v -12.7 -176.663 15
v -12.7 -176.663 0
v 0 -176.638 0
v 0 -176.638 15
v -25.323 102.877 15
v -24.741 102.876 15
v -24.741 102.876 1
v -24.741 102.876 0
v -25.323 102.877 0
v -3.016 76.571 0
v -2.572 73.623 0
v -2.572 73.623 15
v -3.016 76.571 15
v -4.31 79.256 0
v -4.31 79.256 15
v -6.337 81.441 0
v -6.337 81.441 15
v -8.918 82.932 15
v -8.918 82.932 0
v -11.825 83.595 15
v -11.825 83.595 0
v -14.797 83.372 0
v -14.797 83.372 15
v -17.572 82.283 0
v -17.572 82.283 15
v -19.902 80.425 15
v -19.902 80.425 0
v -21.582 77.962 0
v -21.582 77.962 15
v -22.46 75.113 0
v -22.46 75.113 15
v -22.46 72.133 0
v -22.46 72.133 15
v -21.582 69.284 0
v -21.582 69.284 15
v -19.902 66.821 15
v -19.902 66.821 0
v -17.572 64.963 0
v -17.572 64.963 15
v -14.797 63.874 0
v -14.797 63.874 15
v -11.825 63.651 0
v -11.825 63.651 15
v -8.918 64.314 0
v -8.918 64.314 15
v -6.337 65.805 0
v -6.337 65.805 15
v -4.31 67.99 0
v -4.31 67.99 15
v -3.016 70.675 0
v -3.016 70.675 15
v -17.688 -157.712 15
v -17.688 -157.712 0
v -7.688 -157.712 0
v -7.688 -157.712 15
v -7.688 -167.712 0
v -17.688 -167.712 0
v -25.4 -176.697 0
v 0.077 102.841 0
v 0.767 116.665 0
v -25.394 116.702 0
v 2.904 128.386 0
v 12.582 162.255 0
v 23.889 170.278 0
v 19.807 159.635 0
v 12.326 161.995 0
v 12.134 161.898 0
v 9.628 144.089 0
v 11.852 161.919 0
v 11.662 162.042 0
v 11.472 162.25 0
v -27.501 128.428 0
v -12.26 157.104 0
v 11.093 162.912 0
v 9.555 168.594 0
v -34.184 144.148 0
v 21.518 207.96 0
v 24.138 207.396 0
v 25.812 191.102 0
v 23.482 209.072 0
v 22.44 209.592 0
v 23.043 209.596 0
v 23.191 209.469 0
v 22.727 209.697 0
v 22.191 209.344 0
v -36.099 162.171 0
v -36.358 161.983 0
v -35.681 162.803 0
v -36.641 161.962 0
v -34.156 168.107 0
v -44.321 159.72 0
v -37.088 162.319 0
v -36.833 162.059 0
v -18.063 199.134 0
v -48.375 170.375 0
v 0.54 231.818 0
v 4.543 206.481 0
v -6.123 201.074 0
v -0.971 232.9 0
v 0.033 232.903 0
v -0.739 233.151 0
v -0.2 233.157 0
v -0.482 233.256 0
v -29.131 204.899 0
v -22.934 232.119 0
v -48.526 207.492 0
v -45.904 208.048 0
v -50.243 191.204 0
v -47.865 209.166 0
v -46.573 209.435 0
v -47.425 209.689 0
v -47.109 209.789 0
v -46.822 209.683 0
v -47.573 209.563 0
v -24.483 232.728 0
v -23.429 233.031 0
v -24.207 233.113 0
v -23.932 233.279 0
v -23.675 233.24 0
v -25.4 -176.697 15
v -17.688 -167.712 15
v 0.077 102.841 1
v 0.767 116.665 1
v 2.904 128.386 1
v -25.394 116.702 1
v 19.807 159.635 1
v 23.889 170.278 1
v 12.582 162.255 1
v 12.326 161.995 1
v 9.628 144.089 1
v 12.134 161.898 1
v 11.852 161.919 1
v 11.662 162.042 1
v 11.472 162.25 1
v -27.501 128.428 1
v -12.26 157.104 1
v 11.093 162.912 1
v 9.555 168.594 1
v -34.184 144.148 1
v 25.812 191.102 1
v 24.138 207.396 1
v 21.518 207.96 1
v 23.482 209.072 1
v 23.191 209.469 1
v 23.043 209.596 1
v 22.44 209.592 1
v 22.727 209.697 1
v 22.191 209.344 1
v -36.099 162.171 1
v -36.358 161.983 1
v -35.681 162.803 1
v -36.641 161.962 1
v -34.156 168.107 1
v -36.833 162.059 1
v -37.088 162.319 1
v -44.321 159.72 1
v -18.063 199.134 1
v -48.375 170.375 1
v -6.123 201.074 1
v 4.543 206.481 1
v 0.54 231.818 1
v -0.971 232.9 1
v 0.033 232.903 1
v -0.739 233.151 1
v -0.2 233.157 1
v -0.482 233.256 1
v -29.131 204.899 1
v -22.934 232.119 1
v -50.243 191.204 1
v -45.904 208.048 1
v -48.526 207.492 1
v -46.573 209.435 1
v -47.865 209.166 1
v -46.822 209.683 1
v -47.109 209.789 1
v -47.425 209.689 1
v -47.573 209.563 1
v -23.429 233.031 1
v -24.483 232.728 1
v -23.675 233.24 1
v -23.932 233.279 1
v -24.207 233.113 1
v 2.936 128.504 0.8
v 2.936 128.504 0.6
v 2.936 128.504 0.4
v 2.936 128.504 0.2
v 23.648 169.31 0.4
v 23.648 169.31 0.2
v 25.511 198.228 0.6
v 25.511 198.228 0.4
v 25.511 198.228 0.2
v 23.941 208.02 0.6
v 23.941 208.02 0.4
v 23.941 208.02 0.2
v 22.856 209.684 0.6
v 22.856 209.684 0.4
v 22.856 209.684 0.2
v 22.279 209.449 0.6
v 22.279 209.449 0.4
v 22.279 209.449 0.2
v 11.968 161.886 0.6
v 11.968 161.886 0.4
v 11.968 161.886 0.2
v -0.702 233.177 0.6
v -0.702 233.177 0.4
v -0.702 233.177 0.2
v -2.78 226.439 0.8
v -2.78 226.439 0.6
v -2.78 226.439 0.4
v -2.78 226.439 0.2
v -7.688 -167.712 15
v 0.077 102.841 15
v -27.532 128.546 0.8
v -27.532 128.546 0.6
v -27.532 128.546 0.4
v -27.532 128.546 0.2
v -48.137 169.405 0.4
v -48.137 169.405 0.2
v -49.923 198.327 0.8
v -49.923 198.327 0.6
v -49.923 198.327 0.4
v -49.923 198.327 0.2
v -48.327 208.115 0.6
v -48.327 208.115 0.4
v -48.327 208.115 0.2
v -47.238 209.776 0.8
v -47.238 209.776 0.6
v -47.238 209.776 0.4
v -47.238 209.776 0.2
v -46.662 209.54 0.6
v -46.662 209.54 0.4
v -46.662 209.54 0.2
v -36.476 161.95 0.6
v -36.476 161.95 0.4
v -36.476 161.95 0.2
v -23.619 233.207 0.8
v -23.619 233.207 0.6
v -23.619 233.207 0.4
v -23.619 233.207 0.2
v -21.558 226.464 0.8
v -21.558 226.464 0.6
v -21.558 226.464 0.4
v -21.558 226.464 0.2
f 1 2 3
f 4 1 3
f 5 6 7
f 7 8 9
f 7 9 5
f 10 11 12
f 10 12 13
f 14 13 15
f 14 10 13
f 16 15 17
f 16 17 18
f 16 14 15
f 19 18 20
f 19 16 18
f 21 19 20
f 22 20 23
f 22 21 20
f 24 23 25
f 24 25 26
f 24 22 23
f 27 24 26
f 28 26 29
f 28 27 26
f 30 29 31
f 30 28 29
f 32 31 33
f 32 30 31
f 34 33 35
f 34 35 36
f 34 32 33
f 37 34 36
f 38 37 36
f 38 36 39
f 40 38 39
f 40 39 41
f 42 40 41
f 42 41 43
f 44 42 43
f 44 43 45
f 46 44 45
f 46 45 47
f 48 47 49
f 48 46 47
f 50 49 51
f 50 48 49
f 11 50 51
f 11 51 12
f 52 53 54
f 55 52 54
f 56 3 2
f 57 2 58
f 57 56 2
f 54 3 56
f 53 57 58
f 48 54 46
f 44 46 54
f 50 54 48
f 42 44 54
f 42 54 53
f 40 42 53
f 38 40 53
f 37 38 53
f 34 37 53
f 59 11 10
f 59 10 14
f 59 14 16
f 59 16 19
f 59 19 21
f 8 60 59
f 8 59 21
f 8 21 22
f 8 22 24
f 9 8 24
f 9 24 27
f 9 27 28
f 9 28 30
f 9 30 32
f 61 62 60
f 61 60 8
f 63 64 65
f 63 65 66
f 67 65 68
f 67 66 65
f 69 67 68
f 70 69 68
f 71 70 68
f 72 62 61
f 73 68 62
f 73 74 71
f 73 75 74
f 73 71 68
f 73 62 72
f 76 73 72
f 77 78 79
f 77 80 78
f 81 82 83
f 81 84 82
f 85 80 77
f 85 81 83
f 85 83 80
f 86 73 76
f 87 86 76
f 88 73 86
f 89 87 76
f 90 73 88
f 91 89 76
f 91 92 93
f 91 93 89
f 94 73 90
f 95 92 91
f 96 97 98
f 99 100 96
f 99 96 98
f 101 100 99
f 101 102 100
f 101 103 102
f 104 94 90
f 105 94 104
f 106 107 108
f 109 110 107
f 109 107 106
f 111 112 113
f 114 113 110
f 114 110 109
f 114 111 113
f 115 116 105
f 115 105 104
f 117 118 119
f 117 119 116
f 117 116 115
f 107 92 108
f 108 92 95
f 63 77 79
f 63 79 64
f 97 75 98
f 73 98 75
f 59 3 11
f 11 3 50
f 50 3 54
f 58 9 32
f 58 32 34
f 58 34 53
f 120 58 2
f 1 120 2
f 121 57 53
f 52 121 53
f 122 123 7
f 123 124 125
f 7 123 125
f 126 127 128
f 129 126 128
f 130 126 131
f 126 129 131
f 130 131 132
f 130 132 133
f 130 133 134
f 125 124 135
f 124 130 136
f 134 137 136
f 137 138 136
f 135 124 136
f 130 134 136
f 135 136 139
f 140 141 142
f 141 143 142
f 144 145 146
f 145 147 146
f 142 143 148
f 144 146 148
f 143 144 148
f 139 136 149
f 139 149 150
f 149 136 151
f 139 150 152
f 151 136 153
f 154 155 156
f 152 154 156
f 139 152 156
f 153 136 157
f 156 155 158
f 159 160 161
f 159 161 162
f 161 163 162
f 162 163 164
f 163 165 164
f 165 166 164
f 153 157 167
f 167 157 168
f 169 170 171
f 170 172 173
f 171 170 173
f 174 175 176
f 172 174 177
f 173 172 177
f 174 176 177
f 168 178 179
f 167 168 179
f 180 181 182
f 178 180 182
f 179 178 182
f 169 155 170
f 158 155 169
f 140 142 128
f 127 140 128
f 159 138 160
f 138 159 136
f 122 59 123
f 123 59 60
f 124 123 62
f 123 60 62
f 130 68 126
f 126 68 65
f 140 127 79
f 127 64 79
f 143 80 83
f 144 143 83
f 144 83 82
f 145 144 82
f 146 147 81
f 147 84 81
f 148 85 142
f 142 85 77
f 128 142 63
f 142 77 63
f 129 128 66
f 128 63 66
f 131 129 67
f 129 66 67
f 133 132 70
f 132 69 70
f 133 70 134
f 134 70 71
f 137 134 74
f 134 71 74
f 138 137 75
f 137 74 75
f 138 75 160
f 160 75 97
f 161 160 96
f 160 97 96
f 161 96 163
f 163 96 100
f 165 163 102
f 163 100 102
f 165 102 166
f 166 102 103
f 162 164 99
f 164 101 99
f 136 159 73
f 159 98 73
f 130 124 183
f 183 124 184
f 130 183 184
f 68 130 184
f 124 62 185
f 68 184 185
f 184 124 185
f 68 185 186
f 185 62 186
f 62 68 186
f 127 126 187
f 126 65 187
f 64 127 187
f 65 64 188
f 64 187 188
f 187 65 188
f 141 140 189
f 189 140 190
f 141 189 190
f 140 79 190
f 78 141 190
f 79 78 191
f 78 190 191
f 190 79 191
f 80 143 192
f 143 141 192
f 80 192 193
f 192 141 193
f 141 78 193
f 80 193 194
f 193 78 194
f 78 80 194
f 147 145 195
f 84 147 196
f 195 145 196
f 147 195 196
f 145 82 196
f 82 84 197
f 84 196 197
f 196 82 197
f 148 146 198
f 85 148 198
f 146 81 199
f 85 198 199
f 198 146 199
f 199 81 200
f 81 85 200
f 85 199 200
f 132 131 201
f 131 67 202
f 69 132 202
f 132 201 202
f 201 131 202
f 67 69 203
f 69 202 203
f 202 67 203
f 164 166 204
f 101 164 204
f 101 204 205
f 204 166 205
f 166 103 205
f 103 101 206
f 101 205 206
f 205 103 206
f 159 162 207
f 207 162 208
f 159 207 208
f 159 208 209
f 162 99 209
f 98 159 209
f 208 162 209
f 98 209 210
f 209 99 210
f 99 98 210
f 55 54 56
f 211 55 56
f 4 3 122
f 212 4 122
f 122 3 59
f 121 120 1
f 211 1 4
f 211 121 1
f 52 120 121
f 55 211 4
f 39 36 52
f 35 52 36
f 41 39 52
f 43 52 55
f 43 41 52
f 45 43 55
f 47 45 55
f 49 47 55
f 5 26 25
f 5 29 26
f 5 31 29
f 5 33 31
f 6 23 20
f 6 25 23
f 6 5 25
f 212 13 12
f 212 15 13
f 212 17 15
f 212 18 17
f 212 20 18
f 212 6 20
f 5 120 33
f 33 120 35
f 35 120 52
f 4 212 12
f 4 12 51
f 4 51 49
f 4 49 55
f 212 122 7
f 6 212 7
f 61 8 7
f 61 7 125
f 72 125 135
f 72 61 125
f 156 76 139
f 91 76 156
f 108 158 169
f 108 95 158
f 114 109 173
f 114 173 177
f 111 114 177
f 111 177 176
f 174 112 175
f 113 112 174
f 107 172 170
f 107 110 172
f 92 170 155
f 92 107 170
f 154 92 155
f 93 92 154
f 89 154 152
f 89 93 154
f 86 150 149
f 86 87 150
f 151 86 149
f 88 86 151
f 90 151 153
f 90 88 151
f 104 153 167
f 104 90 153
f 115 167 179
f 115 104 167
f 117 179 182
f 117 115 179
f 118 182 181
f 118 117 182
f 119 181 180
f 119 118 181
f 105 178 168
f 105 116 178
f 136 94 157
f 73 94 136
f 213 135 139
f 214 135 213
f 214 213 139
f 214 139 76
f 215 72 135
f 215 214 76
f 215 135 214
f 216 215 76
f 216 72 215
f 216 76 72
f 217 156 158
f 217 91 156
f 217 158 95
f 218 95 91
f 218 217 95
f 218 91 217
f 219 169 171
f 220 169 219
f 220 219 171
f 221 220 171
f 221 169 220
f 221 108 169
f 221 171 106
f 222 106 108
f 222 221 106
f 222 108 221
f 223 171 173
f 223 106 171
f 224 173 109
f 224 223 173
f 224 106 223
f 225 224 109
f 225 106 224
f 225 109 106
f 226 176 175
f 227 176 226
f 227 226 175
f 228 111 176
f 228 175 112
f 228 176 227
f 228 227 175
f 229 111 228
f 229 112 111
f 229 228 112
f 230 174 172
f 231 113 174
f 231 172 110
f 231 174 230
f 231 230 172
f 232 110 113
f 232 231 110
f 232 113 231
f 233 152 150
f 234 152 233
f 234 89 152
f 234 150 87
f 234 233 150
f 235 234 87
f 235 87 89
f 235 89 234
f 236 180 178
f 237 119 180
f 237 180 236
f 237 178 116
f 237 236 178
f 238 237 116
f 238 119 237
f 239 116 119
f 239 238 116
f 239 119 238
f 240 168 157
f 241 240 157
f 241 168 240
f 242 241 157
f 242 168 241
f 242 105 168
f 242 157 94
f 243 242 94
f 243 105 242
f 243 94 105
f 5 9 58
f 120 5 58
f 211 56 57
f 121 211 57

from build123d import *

# Parameters (mm, degrees)
F0_R     = 10
F1_DEPTH = 15
F2_DEPTH = 1


# Not quite as in the source:
# - the program builds the solid bodies; features that only make, move or delete a surface that nothing else refers to are left out


with BuildPart() as f1:
    # F0 (on Top) → F1 (new body)
    with BuildSketch(Plane.XY):
        Polygon((-24.7408044073, 102.8763536353), (-25.3227068062, 102.8771928915), (-25.4, -176.6965887547), (-12.7000101117, -176.6627696025), (0, -176.6376685866), (0.0772667763, 102.8405594523), align=None)
        Polygon((-7.6882185823, -167.7120473838), (-12.6882185823, -167.7120473838), (-17.6882185823, -167.7120473838), (-17.6882185823, -157.7120473838), (-7.6882185823, -157.7120473838), align=None, mode=Mode.SUBTRACT)
        with Locations((-12.5718917698, 73.6229792237)):
            Circle(F0_R, mode=Mode.SUBTRACT)
    extrude(amount=F1_DEPTH)

    # F0 (on Top) → F2 (join)
    with BuildSketch(Plane.XY):
        with BuildLine():
            add(Edge.make_bspline(
                [(-24.7408044073, 102.8763536353), (-24.5499731224, 146.3058625973), (-56.1264111013, 148.8115226622), (-46.337718937, 244.1291976069), (-35.7951301844, 108.7183096569), (-23.6763074235, 294.8900000324), (-17.3487418132, 180.0091377711), (-12.2603111545, 157.1042177733)],
                knots=[5.1182e-06, 5.1182e-06, 5.1182e-06, 5.1182e-06, 0.2151732827, 0.3772222016, 0.5556150865, 0.7731213903, 0.9948403354, 0.9948403354, 0.9948403354, 0.9948403354], degree=3))
            Line((-24.7408044073, 102.8763536353), (0.0772667763, 102.8405594523))
            add(Edge.make_bspline(
                [(0.0772667763, 102.8405594523), (0, 146.2734540246), (31.583875119, 148.6950964448), (22.0462684069, 244.039109704), (11.1469408614, 108.6564689703), (-0.4813218442, 294.8594433526), (-7.1115491577, 179.9956514674), (-12.2603111545, 157.1042177733)],
                knots=[0, 0, 0, 0, 0.2151732827, 0.3772222016, 0.5556150865, 0.7731213903, 0.9948403354, 0.9948403354, 0.9948403354, 0.9948403354], degree=3))
        make_face()
    extrude(amount=F2_DEPTH)


solid = f1.part
